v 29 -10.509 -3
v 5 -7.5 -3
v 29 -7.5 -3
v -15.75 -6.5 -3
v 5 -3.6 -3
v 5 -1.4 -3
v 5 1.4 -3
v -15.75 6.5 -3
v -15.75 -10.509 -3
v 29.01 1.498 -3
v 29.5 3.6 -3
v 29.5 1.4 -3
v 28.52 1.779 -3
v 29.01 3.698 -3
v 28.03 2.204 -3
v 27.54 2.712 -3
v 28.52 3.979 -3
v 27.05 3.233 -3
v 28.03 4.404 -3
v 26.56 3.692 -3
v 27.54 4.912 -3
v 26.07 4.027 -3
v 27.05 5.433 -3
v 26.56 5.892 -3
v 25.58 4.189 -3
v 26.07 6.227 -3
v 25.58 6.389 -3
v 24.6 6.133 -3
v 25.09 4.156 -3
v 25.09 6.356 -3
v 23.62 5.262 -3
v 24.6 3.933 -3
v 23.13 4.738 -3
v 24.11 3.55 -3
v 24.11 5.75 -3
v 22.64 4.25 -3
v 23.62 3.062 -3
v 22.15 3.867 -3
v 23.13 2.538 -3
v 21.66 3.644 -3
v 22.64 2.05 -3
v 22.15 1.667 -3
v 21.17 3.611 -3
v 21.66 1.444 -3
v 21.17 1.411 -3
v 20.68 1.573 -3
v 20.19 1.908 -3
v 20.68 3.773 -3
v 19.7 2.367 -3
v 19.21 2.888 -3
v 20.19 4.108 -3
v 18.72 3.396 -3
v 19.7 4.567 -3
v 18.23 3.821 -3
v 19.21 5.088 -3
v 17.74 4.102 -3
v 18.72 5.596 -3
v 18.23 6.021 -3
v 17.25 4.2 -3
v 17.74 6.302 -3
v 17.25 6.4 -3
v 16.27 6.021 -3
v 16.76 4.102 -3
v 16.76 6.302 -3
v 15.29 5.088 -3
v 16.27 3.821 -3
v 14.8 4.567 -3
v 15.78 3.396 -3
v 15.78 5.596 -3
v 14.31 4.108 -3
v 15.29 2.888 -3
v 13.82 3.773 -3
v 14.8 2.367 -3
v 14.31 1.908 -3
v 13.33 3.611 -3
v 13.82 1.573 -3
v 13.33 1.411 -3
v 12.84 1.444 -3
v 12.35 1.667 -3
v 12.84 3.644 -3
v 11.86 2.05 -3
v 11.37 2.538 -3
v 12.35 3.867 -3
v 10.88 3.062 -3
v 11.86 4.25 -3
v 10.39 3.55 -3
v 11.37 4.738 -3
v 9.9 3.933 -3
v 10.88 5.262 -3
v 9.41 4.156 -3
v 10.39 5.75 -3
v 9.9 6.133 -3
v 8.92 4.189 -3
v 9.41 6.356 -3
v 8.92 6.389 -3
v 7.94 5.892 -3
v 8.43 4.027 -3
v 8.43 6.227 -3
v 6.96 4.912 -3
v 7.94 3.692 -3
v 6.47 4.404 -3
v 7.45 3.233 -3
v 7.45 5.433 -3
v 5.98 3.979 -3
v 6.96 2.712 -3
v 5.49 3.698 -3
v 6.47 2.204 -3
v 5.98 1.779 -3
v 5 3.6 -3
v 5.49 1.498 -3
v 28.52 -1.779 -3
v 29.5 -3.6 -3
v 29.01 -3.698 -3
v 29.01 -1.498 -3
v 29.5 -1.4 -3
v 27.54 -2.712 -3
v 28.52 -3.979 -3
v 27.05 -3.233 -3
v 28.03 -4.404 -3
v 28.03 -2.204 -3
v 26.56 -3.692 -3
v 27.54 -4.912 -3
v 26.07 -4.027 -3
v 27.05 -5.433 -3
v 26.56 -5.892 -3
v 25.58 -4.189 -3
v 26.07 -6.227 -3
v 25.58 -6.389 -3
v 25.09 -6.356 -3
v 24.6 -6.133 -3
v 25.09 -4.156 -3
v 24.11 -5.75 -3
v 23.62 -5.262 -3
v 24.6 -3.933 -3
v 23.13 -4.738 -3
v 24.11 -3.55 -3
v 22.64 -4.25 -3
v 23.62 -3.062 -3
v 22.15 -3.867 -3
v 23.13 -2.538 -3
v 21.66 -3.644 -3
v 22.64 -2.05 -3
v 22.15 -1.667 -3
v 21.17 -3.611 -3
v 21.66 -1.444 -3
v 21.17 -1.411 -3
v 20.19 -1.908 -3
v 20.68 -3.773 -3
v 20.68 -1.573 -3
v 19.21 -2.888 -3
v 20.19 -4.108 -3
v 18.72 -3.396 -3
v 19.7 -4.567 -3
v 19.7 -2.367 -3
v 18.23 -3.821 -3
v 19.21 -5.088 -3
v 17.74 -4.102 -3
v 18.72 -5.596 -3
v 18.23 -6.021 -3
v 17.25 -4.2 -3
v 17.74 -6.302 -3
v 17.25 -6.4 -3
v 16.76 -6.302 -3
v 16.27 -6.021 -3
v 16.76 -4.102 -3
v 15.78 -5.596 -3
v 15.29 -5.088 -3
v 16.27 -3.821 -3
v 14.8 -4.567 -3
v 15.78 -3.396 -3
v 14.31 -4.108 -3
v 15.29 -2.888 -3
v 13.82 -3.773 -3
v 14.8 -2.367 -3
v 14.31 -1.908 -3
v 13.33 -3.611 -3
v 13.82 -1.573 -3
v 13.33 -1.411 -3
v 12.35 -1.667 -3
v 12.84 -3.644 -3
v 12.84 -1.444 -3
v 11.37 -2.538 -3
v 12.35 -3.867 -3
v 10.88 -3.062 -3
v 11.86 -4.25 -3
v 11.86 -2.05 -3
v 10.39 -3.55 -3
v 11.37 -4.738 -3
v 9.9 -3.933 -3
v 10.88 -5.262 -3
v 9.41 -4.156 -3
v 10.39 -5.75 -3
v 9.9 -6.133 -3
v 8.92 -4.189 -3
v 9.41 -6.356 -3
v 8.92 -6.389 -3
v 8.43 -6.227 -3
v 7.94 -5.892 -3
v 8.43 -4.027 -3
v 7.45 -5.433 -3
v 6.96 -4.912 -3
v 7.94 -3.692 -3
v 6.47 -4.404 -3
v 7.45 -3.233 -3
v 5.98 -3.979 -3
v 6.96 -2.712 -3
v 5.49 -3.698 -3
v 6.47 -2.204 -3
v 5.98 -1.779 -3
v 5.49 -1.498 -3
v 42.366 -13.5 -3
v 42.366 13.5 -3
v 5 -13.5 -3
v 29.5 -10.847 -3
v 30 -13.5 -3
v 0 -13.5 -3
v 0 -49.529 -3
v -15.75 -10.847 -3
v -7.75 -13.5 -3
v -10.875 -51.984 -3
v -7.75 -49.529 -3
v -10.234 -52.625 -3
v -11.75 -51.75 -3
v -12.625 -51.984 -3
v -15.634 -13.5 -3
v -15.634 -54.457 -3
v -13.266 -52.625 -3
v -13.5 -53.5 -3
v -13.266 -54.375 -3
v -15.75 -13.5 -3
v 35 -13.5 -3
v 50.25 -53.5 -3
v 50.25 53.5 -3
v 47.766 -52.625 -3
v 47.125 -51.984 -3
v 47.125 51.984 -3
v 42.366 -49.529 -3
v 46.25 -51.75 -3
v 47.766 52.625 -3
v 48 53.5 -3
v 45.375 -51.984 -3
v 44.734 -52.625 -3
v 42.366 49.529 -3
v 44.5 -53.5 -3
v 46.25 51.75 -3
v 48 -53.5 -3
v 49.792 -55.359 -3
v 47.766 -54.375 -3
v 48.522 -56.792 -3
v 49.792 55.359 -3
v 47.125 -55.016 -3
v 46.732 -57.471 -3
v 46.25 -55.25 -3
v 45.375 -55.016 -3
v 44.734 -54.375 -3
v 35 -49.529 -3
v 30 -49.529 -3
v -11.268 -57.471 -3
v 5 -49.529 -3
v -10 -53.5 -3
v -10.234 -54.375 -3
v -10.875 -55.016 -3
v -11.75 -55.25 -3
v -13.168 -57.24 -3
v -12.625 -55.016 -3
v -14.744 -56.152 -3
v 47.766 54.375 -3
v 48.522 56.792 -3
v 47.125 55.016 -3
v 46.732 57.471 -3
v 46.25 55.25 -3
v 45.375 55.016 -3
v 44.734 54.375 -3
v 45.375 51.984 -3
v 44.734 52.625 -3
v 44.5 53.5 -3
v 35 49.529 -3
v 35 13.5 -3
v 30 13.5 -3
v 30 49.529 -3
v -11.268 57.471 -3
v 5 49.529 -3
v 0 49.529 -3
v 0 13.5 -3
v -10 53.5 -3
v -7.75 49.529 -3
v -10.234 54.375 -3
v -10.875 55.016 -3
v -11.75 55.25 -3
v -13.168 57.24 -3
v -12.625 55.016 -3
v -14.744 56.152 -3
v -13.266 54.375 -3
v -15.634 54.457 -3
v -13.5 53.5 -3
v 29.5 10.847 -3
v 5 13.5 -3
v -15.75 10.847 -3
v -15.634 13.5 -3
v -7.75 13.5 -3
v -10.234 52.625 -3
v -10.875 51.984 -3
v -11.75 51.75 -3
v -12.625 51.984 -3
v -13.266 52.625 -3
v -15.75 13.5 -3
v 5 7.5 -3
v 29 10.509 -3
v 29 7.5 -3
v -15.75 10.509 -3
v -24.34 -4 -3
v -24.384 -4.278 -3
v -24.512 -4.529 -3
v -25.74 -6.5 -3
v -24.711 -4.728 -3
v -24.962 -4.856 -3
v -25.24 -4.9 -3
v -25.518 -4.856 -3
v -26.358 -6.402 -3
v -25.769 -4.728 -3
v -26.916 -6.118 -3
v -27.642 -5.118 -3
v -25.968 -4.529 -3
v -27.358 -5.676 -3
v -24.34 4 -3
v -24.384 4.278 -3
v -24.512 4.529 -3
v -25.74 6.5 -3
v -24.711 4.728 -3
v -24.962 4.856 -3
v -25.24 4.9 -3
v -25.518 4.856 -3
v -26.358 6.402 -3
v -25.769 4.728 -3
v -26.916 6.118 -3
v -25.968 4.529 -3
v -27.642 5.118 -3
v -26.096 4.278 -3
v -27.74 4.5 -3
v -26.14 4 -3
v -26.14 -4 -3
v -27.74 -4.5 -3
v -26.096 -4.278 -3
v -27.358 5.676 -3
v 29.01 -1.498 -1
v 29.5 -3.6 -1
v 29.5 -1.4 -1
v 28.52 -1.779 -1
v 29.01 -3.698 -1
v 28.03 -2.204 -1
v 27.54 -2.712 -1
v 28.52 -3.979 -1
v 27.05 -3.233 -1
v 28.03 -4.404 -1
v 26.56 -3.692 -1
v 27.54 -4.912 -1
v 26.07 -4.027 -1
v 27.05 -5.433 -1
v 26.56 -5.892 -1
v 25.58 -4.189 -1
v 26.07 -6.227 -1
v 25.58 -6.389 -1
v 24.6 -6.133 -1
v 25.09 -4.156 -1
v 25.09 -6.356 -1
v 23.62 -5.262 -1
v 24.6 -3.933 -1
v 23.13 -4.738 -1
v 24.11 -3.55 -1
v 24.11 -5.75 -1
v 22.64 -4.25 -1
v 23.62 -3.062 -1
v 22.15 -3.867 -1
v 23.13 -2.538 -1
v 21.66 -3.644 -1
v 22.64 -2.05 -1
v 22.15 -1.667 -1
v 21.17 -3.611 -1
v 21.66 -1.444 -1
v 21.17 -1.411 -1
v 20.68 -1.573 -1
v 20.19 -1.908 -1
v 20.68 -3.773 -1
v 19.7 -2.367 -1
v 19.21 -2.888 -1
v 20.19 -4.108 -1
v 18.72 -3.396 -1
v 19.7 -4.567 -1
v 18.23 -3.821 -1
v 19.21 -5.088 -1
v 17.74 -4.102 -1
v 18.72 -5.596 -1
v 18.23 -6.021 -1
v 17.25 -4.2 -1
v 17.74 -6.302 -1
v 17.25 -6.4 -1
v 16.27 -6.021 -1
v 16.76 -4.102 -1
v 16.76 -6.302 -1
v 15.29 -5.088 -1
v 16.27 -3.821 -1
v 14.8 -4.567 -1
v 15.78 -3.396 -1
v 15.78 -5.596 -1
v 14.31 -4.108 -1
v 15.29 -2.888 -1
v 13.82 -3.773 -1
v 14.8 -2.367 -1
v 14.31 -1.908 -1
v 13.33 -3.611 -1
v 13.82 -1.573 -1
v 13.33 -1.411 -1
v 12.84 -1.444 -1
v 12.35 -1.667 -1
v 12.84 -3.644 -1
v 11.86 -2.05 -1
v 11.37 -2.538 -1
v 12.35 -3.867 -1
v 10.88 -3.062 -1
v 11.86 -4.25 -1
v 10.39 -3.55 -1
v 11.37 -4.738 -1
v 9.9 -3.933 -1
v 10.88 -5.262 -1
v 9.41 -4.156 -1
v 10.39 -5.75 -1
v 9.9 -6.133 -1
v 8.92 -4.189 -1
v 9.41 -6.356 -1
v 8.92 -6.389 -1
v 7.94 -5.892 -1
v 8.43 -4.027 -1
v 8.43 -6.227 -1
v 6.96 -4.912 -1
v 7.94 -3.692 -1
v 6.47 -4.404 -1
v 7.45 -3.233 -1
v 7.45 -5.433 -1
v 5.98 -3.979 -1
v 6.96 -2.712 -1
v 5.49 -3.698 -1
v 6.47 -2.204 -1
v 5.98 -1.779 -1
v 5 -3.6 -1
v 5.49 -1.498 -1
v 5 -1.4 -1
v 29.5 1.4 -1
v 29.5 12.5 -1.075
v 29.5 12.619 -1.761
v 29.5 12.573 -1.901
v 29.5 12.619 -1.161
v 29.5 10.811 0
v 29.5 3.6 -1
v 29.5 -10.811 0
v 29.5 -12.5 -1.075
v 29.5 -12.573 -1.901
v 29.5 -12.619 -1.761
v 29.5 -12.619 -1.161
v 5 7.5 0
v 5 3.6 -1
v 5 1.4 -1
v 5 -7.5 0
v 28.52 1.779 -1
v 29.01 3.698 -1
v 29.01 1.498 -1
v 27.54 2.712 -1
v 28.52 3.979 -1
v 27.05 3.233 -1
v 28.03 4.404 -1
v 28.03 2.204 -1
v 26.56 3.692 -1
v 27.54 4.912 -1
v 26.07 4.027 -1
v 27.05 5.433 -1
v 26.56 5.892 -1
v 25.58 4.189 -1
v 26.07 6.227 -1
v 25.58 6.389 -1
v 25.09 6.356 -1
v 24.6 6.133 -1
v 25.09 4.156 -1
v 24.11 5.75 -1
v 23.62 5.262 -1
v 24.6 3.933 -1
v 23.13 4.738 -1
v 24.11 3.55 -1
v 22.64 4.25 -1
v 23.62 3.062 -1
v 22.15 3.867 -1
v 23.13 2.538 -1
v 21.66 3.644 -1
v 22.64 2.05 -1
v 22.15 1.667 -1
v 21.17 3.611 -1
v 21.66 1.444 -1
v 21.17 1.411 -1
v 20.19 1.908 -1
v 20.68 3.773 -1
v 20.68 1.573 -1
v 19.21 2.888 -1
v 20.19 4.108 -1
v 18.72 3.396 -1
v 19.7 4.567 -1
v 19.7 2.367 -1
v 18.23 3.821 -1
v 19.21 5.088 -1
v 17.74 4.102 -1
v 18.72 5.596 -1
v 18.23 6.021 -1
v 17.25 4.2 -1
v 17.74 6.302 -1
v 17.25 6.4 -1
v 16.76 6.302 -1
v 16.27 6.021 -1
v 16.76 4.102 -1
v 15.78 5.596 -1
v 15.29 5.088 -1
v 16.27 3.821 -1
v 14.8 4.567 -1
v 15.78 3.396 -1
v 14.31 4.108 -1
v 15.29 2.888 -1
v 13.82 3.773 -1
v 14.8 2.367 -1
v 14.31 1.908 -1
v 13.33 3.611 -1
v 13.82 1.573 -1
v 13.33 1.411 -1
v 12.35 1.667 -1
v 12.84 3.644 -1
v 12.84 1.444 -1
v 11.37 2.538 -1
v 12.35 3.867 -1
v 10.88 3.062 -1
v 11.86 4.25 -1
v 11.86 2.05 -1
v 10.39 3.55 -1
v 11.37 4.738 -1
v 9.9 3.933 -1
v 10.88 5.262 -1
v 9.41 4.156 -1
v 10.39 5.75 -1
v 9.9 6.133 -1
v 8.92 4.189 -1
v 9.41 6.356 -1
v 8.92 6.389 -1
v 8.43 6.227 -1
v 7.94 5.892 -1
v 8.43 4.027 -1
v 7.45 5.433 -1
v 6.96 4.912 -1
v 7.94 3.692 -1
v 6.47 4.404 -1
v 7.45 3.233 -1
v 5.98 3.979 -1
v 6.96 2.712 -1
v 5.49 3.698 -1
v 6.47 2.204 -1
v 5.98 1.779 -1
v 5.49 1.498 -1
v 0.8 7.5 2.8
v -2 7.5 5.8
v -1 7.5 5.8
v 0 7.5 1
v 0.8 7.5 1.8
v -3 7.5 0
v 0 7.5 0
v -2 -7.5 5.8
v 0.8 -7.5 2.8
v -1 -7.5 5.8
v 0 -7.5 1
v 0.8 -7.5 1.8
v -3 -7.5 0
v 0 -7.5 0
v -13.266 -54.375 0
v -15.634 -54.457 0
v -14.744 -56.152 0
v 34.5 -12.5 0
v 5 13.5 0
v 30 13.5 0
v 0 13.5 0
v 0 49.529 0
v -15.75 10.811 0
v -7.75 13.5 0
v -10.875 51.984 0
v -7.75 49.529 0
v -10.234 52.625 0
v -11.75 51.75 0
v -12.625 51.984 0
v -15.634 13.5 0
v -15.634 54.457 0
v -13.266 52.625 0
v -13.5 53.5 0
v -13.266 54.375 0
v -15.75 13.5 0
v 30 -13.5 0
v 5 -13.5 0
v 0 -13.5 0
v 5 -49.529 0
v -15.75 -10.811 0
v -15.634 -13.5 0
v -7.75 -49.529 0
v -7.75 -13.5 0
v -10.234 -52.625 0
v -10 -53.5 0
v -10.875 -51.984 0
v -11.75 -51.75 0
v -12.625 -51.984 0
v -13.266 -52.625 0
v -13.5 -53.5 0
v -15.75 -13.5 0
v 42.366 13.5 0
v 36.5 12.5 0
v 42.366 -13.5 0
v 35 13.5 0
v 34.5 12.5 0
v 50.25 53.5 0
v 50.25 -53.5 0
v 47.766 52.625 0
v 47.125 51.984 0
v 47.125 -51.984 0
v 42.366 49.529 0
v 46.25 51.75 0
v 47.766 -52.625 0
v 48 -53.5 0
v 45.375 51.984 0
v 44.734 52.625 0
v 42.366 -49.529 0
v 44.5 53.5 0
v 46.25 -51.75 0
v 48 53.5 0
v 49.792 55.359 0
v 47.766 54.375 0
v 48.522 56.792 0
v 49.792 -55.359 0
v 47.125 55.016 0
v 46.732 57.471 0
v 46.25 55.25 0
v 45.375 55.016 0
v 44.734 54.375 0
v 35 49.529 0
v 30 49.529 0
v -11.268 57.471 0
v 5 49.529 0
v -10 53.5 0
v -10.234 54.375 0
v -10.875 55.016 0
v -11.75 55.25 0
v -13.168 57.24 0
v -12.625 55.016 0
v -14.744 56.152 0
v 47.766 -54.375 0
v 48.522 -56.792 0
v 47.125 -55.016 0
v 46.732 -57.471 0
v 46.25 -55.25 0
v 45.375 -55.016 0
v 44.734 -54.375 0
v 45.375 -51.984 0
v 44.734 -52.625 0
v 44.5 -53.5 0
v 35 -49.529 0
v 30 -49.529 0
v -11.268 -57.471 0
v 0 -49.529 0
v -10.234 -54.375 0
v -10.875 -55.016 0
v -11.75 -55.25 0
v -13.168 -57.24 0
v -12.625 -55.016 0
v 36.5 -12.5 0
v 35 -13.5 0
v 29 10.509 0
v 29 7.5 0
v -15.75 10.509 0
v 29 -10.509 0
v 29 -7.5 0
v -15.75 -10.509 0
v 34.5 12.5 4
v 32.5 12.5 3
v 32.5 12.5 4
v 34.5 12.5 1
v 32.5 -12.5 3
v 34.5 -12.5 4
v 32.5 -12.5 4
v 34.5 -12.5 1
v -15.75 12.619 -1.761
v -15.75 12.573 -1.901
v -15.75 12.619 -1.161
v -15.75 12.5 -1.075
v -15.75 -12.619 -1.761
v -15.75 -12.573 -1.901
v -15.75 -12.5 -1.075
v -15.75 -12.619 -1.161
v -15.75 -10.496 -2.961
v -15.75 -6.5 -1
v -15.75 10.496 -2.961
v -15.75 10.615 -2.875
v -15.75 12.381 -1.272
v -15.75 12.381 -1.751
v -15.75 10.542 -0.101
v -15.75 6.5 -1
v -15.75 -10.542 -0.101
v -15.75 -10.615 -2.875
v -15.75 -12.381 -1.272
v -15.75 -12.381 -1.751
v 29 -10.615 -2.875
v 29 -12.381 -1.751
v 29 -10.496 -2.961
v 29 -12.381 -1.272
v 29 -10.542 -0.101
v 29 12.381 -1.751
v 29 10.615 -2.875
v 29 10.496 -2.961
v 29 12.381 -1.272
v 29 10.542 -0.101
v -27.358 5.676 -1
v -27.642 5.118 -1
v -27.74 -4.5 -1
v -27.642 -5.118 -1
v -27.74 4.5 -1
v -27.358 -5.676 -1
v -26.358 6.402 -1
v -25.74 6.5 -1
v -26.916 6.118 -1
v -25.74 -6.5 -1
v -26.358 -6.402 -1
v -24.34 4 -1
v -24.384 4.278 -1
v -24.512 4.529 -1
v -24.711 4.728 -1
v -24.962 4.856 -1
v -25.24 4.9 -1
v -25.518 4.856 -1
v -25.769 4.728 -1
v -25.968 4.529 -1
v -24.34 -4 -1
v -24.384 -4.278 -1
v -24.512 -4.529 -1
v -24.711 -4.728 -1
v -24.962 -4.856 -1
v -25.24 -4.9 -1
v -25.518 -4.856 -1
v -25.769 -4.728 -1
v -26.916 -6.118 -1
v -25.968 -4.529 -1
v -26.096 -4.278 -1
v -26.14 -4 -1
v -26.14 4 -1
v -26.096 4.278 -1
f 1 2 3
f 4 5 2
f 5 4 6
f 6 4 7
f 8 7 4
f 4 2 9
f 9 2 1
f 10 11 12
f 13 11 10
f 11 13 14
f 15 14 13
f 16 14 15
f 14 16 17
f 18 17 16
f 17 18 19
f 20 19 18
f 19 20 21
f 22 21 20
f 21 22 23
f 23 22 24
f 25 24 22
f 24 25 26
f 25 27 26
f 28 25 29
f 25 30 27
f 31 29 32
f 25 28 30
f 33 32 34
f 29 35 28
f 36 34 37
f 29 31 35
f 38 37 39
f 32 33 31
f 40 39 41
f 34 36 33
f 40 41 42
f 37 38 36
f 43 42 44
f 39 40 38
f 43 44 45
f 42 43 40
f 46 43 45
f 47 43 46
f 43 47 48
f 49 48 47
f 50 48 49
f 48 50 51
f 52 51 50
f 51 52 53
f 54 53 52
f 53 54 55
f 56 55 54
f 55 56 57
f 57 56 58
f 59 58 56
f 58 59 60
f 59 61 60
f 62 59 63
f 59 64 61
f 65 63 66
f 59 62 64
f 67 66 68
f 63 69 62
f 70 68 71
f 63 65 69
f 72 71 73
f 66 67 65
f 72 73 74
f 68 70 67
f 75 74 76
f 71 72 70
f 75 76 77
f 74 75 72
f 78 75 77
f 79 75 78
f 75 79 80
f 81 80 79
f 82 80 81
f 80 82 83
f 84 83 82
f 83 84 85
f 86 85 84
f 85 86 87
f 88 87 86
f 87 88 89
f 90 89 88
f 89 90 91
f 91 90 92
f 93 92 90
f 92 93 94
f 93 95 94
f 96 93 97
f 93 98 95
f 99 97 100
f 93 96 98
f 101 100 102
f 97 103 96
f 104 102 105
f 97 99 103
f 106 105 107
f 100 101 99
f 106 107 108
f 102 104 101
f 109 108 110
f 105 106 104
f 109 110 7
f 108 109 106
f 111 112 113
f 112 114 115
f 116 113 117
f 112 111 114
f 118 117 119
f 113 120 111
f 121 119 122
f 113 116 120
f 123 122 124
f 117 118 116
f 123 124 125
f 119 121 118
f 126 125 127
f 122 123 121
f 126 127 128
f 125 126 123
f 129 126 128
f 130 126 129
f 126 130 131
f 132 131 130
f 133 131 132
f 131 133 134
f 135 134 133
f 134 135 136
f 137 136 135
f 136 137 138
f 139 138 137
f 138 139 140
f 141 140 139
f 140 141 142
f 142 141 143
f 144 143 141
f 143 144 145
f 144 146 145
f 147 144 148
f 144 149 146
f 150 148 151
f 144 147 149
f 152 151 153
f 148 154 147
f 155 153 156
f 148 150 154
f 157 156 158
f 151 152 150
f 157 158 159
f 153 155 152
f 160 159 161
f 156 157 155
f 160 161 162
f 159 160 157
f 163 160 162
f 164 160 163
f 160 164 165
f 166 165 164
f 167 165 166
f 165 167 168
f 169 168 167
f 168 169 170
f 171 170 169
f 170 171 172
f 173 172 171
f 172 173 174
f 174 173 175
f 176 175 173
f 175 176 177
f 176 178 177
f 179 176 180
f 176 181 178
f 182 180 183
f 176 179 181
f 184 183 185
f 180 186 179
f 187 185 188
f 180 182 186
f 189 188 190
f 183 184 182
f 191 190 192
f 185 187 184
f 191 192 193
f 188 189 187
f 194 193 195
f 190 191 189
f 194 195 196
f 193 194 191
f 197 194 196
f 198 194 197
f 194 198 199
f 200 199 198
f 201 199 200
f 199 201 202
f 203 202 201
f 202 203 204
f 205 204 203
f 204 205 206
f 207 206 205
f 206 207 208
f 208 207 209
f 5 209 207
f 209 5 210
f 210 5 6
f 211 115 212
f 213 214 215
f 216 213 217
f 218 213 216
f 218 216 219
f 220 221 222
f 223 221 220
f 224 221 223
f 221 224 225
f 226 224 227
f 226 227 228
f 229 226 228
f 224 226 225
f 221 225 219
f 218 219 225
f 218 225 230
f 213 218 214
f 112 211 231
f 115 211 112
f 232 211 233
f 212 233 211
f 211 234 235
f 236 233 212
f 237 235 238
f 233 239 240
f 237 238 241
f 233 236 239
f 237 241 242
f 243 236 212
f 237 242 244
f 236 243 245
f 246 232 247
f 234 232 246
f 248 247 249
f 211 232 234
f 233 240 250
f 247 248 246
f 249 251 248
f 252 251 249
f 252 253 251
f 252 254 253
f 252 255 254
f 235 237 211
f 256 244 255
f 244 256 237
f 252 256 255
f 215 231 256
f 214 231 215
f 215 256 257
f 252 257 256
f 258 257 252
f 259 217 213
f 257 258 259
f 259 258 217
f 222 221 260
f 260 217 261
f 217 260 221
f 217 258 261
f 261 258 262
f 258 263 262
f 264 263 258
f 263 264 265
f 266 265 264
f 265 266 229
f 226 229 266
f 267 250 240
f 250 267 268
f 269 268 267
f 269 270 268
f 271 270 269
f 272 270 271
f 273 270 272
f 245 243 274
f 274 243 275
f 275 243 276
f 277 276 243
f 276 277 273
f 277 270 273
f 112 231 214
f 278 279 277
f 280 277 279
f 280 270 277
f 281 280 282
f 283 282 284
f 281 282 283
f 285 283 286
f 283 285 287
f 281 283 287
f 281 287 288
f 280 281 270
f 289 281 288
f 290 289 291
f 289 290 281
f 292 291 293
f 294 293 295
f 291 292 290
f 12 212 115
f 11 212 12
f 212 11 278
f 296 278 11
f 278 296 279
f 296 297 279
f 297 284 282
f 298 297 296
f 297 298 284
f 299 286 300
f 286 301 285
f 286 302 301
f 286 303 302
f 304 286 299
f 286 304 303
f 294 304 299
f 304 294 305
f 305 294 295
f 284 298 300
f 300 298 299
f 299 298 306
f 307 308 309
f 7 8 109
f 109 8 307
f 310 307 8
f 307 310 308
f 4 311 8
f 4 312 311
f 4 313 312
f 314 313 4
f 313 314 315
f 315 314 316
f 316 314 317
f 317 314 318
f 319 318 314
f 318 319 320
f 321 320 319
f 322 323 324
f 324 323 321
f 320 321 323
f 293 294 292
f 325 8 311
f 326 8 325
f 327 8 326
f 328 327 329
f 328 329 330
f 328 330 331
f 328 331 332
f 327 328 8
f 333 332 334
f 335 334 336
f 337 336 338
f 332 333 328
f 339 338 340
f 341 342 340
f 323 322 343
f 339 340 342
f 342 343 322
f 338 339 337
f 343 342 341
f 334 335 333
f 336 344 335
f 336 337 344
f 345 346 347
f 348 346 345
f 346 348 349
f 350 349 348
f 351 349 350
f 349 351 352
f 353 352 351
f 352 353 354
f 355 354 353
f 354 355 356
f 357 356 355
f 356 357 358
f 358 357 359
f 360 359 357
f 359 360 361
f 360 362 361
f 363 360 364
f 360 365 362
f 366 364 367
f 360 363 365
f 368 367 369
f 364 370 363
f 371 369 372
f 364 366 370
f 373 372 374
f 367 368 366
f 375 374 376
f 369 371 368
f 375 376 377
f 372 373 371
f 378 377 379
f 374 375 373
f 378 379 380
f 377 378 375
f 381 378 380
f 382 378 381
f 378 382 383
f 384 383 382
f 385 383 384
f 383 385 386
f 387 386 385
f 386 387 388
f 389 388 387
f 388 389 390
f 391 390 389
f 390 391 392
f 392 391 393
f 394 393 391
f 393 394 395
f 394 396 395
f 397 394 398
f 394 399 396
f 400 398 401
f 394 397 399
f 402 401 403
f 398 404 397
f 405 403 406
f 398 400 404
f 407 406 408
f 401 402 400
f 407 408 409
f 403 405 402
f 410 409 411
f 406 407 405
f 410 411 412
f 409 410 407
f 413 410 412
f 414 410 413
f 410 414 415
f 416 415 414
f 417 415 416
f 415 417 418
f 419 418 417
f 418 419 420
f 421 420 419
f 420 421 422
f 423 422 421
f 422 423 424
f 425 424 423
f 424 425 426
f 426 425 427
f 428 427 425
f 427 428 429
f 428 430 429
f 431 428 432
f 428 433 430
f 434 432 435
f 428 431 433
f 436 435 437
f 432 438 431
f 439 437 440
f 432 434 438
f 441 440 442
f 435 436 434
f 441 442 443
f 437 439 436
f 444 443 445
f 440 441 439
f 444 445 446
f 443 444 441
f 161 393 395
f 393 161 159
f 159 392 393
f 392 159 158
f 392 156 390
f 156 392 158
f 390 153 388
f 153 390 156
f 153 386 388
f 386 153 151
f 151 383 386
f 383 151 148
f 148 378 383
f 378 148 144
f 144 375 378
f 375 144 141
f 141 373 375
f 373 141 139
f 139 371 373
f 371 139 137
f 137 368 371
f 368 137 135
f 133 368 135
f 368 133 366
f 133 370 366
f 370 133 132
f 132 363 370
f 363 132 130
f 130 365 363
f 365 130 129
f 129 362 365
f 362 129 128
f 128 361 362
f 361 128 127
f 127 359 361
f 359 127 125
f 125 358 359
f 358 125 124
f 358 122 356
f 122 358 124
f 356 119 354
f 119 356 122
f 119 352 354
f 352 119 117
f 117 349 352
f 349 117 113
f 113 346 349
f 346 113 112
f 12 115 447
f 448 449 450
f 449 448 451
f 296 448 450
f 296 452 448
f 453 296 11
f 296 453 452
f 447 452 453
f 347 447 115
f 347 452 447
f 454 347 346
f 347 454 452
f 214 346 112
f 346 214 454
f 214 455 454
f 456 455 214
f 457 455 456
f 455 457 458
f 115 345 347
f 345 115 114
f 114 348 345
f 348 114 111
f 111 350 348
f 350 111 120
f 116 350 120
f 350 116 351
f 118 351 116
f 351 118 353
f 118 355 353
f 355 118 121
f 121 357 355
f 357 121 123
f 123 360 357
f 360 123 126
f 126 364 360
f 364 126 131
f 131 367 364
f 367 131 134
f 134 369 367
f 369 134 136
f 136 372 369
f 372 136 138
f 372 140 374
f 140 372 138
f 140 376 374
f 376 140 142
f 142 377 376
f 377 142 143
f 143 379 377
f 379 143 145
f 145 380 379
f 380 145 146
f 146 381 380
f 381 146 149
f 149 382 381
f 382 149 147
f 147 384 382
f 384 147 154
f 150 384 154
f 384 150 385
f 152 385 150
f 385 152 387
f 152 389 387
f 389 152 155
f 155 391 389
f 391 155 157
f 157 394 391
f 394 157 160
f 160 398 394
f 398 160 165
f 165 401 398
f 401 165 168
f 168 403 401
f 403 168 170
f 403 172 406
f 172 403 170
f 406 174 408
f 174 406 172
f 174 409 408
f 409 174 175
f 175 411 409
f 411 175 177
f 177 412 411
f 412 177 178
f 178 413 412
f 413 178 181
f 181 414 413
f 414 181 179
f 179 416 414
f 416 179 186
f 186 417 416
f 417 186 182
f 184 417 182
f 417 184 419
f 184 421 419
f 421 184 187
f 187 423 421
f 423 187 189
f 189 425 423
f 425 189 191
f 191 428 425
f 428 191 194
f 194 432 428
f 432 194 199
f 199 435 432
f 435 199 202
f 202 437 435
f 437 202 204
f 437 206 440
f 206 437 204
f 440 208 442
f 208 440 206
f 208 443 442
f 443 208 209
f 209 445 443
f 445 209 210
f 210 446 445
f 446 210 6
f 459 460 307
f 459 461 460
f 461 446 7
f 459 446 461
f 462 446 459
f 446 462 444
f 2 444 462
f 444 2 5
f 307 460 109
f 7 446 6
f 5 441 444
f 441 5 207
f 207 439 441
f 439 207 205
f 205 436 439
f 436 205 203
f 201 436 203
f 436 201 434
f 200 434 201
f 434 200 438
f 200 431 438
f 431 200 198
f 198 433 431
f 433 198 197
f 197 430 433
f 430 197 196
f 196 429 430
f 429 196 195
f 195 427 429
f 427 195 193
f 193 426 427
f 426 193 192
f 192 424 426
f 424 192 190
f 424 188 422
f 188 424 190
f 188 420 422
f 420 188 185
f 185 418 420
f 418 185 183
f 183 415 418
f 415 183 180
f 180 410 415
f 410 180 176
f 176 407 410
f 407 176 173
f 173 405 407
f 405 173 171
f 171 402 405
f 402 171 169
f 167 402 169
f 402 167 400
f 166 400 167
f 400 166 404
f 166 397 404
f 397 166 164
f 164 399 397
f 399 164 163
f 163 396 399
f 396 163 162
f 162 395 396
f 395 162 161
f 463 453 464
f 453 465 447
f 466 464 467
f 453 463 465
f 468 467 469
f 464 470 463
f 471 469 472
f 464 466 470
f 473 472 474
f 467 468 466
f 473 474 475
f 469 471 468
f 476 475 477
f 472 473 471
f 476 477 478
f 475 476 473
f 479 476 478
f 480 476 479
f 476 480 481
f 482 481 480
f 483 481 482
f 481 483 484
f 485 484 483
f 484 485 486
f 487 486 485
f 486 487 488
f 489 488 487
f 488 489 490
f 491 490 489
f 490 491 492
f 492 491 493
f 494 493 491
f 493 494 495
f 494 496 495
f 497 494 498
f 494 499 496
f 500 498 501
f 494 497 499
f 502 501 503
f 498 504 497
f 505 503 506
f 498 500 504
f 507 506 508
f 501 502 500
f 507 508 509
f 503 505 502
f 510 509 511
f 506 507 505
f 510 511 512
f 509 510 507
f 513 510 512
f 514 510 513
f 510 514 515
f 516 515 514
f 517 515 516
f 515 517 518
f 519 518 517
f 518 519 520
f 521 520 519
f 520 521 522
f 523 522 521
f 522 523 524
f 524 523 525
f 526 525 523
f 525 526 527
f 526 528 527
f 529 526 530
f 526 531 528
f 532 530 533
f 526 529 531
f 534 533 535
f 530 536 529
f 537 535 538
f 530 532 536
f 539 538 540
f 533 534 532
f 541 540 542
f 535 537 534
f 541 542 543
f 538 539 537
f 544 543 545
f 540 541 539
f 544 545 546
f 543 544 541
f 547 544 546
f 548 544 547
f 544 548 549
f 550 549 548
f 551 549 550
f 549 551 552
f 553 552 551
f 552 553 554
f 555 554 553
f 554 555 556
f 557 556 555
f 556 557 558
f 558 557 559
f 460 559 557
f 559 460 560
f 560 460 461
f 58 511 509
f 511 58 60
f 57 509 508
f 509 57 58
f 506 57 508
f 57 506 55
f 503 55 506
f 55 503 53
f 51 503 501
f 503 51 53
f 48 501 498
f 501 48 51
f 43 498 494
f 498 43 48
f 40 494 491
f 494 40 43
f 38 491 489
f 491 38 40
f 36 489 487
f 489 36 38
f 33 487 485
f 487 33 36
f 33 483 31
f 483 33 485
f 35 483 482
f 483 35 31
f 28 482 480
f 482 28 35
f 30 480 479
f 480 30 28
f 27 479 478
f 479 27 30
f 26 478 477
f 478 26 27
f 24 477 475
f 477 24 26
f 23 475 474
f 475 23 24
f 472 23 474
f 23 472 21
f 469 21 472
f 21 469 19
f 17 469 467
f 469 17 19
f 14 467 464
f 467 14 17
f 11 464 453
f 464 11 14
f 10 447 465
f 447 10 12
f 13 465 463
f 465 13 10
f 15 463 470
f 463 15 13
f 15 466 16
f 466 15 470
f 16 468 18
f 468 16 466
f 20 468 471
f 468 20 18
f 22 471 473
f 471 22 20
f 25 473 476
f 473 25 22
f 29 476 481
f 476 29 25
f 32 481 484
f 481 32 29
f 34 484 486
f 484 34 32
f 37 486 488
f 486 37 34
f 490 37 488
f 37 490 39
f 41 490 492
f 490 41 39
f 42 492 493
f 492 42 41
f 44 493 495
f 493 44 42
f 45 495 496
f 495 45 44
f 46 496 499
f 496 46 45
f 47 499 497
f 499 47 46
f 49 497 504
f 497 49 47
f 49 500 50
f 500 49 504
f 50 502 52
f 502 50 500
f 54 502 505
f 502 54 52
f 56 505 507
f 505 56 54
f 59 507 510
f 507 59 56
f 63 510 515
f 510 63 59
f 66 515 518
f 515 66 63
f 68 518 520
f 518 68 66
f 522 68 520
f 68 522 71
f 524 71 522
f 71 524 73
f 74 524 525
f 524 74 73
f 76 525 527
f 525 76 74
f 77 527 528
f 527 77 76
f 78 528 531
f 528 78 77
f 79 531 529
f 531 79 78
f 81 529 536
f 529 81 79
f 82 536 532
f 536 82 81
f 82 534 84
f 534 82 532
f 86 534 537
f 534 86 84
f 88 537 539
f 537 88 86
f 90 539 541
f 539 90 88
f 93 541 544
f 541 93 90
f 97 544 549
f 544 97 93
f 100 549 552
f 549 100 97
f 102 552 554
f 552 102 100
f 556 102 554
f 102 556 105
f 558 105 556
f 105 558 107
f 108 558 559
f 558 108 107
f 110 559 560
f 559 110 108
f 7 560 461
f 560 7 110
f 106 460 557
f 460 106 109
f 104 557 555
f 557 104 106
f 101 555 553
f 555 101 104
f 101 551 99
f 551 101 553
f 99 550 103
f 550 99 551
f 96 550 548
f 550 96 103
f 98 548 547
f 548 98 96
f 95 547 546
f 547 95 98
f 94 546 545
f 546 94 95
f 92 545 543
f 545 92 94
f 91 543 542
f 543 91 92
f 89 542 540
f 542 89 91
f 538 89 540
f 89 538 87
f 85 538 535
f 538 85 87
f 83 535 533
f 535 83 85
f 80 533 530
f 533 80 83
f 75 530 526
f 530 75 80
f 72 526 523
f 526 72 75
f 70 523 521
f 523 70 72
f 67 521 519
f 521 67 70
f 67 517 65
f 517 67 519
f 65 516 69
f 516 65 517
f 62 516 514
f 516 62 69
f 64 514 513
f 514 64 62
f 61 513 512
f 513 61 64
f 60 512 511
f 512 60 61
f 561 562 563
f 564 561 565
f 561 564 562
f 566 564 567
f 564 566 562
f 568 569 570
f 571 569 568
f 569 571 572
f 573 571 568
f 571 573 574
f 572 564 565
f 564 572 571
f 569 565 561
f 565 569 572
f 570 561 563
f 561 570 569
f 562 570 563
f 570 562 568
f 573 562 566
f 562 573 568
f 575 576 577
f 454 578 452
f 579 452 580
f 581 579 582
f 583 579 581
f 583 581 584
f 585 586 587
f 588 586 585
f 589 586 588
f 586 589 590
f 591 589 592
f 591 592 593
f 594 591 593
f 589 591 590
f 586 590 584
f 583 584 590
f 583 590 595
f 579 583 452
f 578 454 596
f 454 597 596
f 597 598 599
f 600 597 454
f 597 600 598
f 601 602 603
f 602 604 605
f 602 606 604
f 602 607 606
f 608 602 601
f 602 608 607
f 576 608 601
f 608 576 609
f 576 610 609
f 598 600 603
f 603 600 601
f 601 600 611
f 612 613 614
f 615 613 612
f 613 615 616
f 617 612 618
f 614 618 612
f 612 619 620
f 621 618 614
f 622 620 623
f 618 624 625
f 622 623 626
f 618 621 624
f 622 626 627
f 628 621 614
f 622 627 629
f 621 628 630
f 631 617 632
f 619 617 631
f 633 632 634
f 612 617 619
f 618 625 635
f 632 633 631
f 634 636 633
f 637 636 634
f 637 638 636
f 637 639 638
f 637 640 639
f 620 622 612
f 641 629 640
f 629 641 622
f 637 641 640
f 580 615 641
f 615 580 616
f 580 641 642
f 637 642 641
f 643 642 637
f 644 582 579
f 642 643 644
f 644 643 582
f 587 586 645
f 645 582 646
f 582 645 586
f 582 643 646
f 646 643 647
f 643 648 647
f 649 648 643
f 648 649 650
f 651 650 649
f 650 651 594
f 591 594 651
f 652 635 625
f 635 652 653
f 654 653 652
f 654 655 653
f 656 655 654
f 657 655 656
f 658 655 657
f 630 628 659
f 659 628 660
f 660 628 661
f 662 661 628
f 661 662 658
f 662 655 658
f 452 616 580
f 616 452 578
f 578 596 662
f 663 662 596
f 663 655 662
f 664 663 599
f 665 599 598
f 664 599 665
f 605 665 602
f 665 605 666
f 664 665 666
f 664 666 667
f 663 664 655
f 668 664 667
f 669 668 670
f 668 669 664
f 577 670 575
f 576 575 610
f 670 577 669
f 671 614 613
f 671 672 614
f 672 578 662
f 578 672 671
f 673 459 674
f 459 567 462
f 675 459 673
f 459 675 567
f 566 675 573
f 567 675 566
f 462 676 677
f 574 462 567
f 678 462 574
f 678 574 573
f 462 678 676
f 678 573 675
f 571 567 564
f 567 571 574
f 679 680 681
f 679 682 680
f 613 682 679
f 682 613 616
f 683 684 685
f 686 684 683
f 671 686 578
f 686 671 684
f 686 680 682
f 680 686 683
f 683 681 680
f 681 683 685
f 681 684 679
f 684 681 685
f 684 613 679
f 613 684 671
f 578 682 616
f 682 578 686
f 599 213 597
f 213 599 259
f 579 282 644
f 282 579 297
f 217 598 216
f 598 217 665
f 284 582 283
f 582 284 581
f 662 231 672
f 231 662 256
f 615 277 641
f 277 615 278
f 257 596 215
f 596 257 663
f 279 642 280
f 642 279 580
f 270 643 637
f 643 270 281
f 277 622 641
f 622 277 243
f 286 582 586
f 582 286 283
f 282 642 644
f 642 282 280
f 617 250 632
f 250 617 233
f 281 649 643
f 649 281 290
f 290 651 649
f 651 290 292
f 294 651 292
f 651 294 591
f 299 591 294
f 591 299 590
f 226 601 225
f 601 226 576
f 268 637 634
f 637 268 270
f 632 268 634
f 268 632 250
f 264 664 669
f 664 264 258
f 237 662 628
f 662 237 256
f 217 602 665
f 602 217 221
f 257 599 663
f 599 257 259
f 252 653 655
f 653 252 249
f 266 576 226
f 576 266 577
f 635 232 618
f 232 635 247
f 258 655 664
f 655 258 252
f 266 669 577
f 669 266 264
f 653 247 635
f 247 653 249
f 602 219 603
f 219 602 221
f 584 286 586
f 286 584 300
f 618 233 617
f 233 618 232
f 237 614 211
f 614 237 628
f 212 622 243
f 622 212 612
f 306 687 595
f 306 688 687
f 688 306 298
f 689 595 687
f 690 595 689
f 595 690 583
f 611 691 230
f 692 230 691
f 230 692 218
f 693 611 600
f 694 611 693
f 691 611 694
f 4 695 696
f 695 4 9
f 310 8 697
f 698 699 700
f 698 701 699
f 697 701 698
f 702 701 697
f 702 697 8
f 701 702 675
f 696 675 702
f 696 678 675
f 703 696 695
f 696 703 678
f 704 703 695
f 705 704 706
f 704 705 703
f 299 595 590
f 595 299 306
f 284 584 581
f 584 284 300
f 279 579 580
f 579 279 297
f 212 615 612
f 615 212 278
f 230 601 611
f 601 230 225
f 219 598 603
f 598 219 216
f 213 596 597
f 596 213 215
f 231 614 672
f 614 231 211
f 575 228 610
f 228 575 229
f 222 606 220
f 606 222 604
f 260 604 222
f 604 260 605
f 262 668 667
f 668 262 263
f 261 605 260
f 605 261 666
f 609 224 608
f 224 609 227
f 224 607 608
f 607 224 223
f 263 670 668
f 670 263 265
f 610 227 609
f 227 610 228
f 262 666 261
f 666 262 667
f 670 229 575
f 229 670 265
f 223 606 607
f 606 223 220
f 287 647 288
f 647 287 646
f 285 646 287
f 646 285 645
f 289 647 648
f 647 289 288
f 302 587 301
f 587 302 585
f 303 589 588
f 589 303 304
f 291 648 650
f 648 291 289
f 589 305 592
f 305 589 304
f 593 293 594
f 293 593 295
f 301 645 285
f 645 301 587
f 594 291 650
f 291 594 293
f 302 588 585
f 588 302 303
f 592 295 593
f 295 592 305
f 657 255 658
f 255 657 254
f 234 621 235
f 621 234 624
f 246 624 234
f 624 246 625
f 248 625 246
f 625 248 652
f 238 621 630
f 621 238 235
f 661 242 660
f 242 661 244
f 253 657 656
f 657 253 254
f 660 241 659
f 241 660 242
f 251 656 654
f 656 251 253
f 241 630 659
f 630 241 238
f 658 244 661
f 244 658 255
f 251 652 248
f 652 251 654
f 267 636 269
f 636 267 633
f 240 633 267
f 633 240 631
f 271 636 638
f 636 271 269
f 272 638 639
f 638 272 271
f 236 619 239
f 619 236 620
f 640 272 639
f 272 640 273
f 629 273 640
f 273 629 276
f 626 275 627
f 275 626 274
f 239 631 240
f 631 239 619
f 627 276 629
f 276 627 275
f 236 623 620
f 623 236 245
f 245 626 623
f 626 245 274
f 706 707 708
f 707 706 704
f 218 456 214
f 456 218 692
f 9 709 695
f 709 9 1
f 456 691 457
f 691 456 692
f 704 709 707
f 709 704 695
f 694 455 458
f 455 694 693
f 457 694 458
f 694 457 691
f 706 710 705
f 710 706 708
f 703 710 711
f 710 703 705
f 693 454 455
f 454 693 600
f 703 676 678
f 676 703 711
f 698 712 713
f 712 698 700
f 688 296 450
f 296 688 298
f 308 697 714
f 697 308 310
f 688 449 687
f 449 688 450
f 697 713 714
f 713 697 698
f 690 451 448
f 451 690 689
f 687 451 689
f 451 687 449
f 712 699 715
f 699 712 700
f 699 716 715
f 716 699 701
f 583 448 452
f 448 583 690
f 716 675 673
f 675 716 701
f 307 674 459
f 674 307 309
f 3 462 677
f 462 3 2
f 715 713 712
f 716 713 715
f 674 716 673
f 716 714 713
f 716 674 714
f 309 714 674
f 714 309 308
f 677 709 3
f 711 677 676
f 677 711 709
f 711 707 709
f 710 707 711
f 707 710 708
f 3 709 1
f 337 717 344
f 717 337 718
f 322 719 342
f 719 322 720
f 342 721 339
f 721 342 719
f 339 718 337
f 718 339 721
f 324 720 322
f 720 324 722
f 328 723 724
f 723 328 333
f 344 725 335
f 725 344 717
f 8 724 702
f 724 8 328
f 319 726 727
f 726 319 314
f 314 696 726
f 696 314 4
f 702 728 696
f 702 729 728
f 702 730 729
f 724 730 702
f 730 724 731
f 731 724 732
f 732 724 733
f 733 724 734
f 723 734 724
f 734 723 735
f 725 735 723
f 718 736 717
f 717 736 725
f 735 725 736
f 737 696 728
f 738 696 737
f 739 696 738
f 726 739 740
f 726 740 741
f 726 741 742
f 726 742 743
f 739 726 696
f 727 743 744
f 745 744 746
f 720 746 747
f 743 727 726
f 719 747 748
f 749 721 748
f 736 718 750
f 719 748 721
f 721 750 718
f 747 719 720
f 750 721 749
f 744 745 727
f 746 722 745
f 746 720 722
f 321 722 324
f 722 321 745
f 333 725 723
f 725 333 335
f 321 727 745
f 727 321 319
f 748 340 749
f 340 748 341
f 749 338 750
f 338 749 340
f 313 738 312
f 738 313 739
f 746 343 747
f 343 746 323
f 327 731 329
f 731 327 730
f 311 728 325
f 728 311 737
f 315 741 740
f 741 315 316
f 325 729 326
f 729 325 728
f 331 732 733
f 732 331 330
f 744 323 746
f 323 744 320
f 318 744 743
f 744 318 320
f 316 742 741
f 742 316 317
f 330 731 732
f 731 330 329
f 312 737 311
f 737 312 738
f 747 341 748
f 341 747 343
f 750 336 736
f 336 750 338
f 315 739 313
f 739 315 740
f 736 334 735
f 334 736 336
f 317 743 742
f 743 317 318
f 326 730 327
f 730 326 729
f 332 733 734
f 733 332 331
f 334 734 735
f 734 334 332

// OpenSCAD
// -*- mode: scad; c-basic-offset: 2; indent-tabs-mode: nil; -*-
// (c) h.zeller@acm.org License: CC-BY-SA
e=0.01;

with_frame=true;             // The mounting frame
with_isolation=false;         // isolation layer in frame
with_spring_cover=false;     // covering the spring with cover (needs bridging)
with_whole_width_rest=true;  // rest on din-rail for whole length.
lug_len=10;            // Length of the lug used pull down to remove from rail

// Size of the hole-pattern for mounting.
screw_along  = 107;
screw_across = 58;
screw_bar=8;           // Width of the outer frame bar with screw holes
screw_dia=3.5;

bottom_thick=3;       // Thickness of whole underside frame
isolation_thick=0.4;  // Thickness of isolation bottom.

// These depend on the filament, needs experimentation for each filament.
spring_height=2;      // Needs to be < bottom_thick if with_spring_cover
spring_thick=2.2;

rest_shelf=5;         // The width of the area resting on the rail itself.
hold_wide=25;         // The width of the top 'hook' holding on the rail.
latch_wide=15;        // The width of the moveable clip at the bottom of rail.
slide_gap=0.25;       // In-place printed gap for clip to move.

// General sizing of the DIN rail. Essentially constants
din_wide=35;
din_dist=din_wide - 0.5; // Slightly smaller for more clamping action.
din_sheet=1;           // thickness of the din-rail metal

plate_x = screw_across + screw_bar;
plate_y = hold_wide + 2;

module hook_polygon(do_slide=false) {
  w=1;
  h=do_slide ? 0.8 : 2;
  ledge=1;
  hd=sqrt(2) * h;
  // TODO: doing both hook types in one do_slide-configured array is not
  // very readable and should be broken up into two.
  polygon([[-2*w, -bottom_thick], [0, -bottom_thick], [0, din_sheet],
           [h, h + din_sheet], [h, h + ledge + din_sheet],
           if (do_slide) [-1, h + ledge + din_sheet+3],
           if (do_slide) [-2, h + ledge + din_sheet+3],
           if (do_slide) [-3, 0],
           if (!do_slide) [0, h + ledge + din_sheet],
           [-2*w, 0],
           ]);
}

module hook(len=15, do_slide=false) {
  translate([0, len/2, 0]) rotate([90, 0, 0])
    linear_extrude(height=len) hook_polygon(do_slide);
}

module spring_polygon(len=20, wide=15, thick=1) {
  p=3;  // periods
  n=50;
  actual_w=wide/2 - thick/2;
  points = [
    for (i = [0:n]) [ len*i/n, actual_w*cos(i * p * 360 / n) + thick/2],
    for (i = [0:n]) [ len*(n-i)/n, actual_w*cos((n-i) * p * 360 / n) - thick/2],
  ];

  translate([0, -actual_w, 0]) polygon(points);
}

module spring(len=20, wide=15, thick=1, height=1) {
  linear_extrude(height=height) spring_polygon(len, wide, thick);
}

module spring_symmetric(len=20, wide=15, delta=5, thick=1, height=1) {
  half_w=wide/2-delta/2;
  translate([0, -delta/2, -bottom_thick]) spring(len, half_w, thick, height);
  scale([1, -1, 1]) translate([0, -delta/2, -bottom_thick])
    spring(len, half_w, thick, height);
}

module bottom_plate() {
  w = screw_along;
  h = screw_across;

  difference() {
    translate([din_dist/2, 0, -bottom_thick/2]) {
      cube([plate_x, plate_y, bottom_thick], center=true);

      if (with_frame) {
        if (with_isolation) {
          translate([-h/2, -w/2, -bottom_thick/2]) cube([h, w, isolation_thick]);
        }

        if (with_whole_width_rest) {
          translate([-din_dist/2, -w/2, -bottom_thick/2])
            cube([rest_shelf, w, bottom_thick]);
          translate([-din_dist/2 + din_wide - rest_shelf, -w/2, -bottom_thick/2])
            cube([rest_shelf, w, bottom_thick]);
        }

        // frame around. hull() joined cylinders making nice rounded corners.
        hull() {
          translate([h/2, w/2, -bottom_thick/2]) cylinder(r=screw_bar/2, h=bottom_thick);
          translate([-h/2, w/2, -bottom_thick/2]) cylinder(r=screw_bar/2, h=bottom_thick);
        }
        hull() {
          translate([h/2, -w/2, -bottom_thick/2]) cylinder(r=screw_bar/2, h=bottom_thick);
          translate([-h/2, -w/2, -bottom_thick/2]) cylinder(r=screw_bar/2, h=bottom_thick);
        }
        hull() {
          translate([-h/2, w/2, -bottom_thick/2]) cylinder(r=screw_bar/2, h=bottom_thick);
          translate([-h/2, -w/2, -bottom_thick/2]) cylinder(r=screw_bar/2, h=bottom_thick);
        }
        hull() {
          translate([h/2, w/2, -bottom_thick/2]) cylinder(r=screw_bar/2, h=bottom_thick);
          translate([h/2, -w/2, -bottom_thick/2]) cylinder(r=screw_bar/2, h=bottom_thick);
        }
      }
    }

    for (dx = [-1, 1]) {
      for (dy = [-1, 1]) {
        translate([din_dist/2+dx*h/2, dy*w/2, -bottom_thick-e]) cylinder(r=screw_dia/2, h=bottom_thick+2*e, $fn=12);
      }
    }
  }
}

module spring_latch() {
  hook(len=latch_wide, do_slide=true);

  translate([rest_shelf, 0, 0]) spring_symmetric(len=din_dist - 2*rest_shelf,
                                                 thick=spring_thick,
                                                 wide=latch_wide,
                                                 delta=5, height=spring_height);
}

module dovetail(h=2, gap=slide_gap, len=20) {
  c=h/10;  // center
  out=h/1.5;
  hull() {
    translate([-h/2, -gap/2+e, 0]) cylinder(r=gap/2, h=len);
    translate([-c, -out, 0]) cylinder(r=gap/2, h=len);
  }
  hull() {
    translate([-c, -out, 0]) cylinder(r=gap/2, h=len);
    translate([+c, -out, 0]) cylinder(r=gap/2, h=len);
  }
  hull() {
    translate([+c, -out, 0]) cylinder(r=gap/2, h=len);
    translate([+h/2, -gap/2+e, 0]) cylinder(r=gap/2, h=len);
  }
}

module one_slide(len=2, slide_wide=(plate_y-latch_wide)/4) {
  translate([din_dist-rest_shelf, -latch_wide/2-slide_wide, -bottom_thick/2])
    rotate([0, -90, 0]) dovetail(h=bottom_thick, len=len);
}

module spring_punch(skin=with_spring_cover ? isolation_thick : 0) {
  color("yellow") translate([rest_shelf, -latch_wide/2, -bottom_thick-e-skin])
    cube([din_dist-2*rest_shelf, latch_wide, bottom_thick+2*e]);
}

module punch() {
  spring_punch();  // Space for the spring.
  hull() {
    one_slide(len=0.5);
    scale([1, -1, 1]) one_slide(len=0.5);
  }
  one_slide(len=screw_across);
  scale([1, -1, 1]) one_slide(len=screw_across);
}

module open_pull_lug(h=2) {
  r=2;
  wide=6.5;  // half-wide. Good enough for pocket knife blade.
  translate([e, 0, -bottom_thick])
    difference() {
    hull() {
      translate([-lug_len, -wide, 0]) cube([lug_len, 2*wide, h]);
      translate([-lug_len, -wide+r, 0]) cylinder(r=r, h=h, $fn=20);
      translate([-lug_len, +wide-r, 0]) cylinder(r=r, h=h, $fn=20);
    }
    translate([0, 0, -e]) hull() {
      translate([-lug_len+0.5, -wide+0.5+r, 0]) cylinder(r=1.8/2, h=h+2*e, $fn=20);
      translate([-lug_len+0.5, +wide-0.5-r, 0]) cylinder(r=1.8/2, h=h+2*e, $fn=20);
    }
  }
}


// Hooks
module assembly_part_hooks() {
  // retainer hook
  translate([din_dist, 0, 0]) scale([-1, 1, 1]) hook(len=hold_wide);
  spring_latch();  // latching hook
}

module assembly_part_baseplate() {
  // Place to mount PCB etc.
  difference() {
      bottom_plate();
      punch();
    }
}

module assembly_part_pull() {
  // Make simple to open.
  translate([-(plate_x - din_dist)/2, 0, 0]) open_pull_lug();
}

assembly_part_hooks();
assembly_part_baseplate();
assembly_part_pull();
